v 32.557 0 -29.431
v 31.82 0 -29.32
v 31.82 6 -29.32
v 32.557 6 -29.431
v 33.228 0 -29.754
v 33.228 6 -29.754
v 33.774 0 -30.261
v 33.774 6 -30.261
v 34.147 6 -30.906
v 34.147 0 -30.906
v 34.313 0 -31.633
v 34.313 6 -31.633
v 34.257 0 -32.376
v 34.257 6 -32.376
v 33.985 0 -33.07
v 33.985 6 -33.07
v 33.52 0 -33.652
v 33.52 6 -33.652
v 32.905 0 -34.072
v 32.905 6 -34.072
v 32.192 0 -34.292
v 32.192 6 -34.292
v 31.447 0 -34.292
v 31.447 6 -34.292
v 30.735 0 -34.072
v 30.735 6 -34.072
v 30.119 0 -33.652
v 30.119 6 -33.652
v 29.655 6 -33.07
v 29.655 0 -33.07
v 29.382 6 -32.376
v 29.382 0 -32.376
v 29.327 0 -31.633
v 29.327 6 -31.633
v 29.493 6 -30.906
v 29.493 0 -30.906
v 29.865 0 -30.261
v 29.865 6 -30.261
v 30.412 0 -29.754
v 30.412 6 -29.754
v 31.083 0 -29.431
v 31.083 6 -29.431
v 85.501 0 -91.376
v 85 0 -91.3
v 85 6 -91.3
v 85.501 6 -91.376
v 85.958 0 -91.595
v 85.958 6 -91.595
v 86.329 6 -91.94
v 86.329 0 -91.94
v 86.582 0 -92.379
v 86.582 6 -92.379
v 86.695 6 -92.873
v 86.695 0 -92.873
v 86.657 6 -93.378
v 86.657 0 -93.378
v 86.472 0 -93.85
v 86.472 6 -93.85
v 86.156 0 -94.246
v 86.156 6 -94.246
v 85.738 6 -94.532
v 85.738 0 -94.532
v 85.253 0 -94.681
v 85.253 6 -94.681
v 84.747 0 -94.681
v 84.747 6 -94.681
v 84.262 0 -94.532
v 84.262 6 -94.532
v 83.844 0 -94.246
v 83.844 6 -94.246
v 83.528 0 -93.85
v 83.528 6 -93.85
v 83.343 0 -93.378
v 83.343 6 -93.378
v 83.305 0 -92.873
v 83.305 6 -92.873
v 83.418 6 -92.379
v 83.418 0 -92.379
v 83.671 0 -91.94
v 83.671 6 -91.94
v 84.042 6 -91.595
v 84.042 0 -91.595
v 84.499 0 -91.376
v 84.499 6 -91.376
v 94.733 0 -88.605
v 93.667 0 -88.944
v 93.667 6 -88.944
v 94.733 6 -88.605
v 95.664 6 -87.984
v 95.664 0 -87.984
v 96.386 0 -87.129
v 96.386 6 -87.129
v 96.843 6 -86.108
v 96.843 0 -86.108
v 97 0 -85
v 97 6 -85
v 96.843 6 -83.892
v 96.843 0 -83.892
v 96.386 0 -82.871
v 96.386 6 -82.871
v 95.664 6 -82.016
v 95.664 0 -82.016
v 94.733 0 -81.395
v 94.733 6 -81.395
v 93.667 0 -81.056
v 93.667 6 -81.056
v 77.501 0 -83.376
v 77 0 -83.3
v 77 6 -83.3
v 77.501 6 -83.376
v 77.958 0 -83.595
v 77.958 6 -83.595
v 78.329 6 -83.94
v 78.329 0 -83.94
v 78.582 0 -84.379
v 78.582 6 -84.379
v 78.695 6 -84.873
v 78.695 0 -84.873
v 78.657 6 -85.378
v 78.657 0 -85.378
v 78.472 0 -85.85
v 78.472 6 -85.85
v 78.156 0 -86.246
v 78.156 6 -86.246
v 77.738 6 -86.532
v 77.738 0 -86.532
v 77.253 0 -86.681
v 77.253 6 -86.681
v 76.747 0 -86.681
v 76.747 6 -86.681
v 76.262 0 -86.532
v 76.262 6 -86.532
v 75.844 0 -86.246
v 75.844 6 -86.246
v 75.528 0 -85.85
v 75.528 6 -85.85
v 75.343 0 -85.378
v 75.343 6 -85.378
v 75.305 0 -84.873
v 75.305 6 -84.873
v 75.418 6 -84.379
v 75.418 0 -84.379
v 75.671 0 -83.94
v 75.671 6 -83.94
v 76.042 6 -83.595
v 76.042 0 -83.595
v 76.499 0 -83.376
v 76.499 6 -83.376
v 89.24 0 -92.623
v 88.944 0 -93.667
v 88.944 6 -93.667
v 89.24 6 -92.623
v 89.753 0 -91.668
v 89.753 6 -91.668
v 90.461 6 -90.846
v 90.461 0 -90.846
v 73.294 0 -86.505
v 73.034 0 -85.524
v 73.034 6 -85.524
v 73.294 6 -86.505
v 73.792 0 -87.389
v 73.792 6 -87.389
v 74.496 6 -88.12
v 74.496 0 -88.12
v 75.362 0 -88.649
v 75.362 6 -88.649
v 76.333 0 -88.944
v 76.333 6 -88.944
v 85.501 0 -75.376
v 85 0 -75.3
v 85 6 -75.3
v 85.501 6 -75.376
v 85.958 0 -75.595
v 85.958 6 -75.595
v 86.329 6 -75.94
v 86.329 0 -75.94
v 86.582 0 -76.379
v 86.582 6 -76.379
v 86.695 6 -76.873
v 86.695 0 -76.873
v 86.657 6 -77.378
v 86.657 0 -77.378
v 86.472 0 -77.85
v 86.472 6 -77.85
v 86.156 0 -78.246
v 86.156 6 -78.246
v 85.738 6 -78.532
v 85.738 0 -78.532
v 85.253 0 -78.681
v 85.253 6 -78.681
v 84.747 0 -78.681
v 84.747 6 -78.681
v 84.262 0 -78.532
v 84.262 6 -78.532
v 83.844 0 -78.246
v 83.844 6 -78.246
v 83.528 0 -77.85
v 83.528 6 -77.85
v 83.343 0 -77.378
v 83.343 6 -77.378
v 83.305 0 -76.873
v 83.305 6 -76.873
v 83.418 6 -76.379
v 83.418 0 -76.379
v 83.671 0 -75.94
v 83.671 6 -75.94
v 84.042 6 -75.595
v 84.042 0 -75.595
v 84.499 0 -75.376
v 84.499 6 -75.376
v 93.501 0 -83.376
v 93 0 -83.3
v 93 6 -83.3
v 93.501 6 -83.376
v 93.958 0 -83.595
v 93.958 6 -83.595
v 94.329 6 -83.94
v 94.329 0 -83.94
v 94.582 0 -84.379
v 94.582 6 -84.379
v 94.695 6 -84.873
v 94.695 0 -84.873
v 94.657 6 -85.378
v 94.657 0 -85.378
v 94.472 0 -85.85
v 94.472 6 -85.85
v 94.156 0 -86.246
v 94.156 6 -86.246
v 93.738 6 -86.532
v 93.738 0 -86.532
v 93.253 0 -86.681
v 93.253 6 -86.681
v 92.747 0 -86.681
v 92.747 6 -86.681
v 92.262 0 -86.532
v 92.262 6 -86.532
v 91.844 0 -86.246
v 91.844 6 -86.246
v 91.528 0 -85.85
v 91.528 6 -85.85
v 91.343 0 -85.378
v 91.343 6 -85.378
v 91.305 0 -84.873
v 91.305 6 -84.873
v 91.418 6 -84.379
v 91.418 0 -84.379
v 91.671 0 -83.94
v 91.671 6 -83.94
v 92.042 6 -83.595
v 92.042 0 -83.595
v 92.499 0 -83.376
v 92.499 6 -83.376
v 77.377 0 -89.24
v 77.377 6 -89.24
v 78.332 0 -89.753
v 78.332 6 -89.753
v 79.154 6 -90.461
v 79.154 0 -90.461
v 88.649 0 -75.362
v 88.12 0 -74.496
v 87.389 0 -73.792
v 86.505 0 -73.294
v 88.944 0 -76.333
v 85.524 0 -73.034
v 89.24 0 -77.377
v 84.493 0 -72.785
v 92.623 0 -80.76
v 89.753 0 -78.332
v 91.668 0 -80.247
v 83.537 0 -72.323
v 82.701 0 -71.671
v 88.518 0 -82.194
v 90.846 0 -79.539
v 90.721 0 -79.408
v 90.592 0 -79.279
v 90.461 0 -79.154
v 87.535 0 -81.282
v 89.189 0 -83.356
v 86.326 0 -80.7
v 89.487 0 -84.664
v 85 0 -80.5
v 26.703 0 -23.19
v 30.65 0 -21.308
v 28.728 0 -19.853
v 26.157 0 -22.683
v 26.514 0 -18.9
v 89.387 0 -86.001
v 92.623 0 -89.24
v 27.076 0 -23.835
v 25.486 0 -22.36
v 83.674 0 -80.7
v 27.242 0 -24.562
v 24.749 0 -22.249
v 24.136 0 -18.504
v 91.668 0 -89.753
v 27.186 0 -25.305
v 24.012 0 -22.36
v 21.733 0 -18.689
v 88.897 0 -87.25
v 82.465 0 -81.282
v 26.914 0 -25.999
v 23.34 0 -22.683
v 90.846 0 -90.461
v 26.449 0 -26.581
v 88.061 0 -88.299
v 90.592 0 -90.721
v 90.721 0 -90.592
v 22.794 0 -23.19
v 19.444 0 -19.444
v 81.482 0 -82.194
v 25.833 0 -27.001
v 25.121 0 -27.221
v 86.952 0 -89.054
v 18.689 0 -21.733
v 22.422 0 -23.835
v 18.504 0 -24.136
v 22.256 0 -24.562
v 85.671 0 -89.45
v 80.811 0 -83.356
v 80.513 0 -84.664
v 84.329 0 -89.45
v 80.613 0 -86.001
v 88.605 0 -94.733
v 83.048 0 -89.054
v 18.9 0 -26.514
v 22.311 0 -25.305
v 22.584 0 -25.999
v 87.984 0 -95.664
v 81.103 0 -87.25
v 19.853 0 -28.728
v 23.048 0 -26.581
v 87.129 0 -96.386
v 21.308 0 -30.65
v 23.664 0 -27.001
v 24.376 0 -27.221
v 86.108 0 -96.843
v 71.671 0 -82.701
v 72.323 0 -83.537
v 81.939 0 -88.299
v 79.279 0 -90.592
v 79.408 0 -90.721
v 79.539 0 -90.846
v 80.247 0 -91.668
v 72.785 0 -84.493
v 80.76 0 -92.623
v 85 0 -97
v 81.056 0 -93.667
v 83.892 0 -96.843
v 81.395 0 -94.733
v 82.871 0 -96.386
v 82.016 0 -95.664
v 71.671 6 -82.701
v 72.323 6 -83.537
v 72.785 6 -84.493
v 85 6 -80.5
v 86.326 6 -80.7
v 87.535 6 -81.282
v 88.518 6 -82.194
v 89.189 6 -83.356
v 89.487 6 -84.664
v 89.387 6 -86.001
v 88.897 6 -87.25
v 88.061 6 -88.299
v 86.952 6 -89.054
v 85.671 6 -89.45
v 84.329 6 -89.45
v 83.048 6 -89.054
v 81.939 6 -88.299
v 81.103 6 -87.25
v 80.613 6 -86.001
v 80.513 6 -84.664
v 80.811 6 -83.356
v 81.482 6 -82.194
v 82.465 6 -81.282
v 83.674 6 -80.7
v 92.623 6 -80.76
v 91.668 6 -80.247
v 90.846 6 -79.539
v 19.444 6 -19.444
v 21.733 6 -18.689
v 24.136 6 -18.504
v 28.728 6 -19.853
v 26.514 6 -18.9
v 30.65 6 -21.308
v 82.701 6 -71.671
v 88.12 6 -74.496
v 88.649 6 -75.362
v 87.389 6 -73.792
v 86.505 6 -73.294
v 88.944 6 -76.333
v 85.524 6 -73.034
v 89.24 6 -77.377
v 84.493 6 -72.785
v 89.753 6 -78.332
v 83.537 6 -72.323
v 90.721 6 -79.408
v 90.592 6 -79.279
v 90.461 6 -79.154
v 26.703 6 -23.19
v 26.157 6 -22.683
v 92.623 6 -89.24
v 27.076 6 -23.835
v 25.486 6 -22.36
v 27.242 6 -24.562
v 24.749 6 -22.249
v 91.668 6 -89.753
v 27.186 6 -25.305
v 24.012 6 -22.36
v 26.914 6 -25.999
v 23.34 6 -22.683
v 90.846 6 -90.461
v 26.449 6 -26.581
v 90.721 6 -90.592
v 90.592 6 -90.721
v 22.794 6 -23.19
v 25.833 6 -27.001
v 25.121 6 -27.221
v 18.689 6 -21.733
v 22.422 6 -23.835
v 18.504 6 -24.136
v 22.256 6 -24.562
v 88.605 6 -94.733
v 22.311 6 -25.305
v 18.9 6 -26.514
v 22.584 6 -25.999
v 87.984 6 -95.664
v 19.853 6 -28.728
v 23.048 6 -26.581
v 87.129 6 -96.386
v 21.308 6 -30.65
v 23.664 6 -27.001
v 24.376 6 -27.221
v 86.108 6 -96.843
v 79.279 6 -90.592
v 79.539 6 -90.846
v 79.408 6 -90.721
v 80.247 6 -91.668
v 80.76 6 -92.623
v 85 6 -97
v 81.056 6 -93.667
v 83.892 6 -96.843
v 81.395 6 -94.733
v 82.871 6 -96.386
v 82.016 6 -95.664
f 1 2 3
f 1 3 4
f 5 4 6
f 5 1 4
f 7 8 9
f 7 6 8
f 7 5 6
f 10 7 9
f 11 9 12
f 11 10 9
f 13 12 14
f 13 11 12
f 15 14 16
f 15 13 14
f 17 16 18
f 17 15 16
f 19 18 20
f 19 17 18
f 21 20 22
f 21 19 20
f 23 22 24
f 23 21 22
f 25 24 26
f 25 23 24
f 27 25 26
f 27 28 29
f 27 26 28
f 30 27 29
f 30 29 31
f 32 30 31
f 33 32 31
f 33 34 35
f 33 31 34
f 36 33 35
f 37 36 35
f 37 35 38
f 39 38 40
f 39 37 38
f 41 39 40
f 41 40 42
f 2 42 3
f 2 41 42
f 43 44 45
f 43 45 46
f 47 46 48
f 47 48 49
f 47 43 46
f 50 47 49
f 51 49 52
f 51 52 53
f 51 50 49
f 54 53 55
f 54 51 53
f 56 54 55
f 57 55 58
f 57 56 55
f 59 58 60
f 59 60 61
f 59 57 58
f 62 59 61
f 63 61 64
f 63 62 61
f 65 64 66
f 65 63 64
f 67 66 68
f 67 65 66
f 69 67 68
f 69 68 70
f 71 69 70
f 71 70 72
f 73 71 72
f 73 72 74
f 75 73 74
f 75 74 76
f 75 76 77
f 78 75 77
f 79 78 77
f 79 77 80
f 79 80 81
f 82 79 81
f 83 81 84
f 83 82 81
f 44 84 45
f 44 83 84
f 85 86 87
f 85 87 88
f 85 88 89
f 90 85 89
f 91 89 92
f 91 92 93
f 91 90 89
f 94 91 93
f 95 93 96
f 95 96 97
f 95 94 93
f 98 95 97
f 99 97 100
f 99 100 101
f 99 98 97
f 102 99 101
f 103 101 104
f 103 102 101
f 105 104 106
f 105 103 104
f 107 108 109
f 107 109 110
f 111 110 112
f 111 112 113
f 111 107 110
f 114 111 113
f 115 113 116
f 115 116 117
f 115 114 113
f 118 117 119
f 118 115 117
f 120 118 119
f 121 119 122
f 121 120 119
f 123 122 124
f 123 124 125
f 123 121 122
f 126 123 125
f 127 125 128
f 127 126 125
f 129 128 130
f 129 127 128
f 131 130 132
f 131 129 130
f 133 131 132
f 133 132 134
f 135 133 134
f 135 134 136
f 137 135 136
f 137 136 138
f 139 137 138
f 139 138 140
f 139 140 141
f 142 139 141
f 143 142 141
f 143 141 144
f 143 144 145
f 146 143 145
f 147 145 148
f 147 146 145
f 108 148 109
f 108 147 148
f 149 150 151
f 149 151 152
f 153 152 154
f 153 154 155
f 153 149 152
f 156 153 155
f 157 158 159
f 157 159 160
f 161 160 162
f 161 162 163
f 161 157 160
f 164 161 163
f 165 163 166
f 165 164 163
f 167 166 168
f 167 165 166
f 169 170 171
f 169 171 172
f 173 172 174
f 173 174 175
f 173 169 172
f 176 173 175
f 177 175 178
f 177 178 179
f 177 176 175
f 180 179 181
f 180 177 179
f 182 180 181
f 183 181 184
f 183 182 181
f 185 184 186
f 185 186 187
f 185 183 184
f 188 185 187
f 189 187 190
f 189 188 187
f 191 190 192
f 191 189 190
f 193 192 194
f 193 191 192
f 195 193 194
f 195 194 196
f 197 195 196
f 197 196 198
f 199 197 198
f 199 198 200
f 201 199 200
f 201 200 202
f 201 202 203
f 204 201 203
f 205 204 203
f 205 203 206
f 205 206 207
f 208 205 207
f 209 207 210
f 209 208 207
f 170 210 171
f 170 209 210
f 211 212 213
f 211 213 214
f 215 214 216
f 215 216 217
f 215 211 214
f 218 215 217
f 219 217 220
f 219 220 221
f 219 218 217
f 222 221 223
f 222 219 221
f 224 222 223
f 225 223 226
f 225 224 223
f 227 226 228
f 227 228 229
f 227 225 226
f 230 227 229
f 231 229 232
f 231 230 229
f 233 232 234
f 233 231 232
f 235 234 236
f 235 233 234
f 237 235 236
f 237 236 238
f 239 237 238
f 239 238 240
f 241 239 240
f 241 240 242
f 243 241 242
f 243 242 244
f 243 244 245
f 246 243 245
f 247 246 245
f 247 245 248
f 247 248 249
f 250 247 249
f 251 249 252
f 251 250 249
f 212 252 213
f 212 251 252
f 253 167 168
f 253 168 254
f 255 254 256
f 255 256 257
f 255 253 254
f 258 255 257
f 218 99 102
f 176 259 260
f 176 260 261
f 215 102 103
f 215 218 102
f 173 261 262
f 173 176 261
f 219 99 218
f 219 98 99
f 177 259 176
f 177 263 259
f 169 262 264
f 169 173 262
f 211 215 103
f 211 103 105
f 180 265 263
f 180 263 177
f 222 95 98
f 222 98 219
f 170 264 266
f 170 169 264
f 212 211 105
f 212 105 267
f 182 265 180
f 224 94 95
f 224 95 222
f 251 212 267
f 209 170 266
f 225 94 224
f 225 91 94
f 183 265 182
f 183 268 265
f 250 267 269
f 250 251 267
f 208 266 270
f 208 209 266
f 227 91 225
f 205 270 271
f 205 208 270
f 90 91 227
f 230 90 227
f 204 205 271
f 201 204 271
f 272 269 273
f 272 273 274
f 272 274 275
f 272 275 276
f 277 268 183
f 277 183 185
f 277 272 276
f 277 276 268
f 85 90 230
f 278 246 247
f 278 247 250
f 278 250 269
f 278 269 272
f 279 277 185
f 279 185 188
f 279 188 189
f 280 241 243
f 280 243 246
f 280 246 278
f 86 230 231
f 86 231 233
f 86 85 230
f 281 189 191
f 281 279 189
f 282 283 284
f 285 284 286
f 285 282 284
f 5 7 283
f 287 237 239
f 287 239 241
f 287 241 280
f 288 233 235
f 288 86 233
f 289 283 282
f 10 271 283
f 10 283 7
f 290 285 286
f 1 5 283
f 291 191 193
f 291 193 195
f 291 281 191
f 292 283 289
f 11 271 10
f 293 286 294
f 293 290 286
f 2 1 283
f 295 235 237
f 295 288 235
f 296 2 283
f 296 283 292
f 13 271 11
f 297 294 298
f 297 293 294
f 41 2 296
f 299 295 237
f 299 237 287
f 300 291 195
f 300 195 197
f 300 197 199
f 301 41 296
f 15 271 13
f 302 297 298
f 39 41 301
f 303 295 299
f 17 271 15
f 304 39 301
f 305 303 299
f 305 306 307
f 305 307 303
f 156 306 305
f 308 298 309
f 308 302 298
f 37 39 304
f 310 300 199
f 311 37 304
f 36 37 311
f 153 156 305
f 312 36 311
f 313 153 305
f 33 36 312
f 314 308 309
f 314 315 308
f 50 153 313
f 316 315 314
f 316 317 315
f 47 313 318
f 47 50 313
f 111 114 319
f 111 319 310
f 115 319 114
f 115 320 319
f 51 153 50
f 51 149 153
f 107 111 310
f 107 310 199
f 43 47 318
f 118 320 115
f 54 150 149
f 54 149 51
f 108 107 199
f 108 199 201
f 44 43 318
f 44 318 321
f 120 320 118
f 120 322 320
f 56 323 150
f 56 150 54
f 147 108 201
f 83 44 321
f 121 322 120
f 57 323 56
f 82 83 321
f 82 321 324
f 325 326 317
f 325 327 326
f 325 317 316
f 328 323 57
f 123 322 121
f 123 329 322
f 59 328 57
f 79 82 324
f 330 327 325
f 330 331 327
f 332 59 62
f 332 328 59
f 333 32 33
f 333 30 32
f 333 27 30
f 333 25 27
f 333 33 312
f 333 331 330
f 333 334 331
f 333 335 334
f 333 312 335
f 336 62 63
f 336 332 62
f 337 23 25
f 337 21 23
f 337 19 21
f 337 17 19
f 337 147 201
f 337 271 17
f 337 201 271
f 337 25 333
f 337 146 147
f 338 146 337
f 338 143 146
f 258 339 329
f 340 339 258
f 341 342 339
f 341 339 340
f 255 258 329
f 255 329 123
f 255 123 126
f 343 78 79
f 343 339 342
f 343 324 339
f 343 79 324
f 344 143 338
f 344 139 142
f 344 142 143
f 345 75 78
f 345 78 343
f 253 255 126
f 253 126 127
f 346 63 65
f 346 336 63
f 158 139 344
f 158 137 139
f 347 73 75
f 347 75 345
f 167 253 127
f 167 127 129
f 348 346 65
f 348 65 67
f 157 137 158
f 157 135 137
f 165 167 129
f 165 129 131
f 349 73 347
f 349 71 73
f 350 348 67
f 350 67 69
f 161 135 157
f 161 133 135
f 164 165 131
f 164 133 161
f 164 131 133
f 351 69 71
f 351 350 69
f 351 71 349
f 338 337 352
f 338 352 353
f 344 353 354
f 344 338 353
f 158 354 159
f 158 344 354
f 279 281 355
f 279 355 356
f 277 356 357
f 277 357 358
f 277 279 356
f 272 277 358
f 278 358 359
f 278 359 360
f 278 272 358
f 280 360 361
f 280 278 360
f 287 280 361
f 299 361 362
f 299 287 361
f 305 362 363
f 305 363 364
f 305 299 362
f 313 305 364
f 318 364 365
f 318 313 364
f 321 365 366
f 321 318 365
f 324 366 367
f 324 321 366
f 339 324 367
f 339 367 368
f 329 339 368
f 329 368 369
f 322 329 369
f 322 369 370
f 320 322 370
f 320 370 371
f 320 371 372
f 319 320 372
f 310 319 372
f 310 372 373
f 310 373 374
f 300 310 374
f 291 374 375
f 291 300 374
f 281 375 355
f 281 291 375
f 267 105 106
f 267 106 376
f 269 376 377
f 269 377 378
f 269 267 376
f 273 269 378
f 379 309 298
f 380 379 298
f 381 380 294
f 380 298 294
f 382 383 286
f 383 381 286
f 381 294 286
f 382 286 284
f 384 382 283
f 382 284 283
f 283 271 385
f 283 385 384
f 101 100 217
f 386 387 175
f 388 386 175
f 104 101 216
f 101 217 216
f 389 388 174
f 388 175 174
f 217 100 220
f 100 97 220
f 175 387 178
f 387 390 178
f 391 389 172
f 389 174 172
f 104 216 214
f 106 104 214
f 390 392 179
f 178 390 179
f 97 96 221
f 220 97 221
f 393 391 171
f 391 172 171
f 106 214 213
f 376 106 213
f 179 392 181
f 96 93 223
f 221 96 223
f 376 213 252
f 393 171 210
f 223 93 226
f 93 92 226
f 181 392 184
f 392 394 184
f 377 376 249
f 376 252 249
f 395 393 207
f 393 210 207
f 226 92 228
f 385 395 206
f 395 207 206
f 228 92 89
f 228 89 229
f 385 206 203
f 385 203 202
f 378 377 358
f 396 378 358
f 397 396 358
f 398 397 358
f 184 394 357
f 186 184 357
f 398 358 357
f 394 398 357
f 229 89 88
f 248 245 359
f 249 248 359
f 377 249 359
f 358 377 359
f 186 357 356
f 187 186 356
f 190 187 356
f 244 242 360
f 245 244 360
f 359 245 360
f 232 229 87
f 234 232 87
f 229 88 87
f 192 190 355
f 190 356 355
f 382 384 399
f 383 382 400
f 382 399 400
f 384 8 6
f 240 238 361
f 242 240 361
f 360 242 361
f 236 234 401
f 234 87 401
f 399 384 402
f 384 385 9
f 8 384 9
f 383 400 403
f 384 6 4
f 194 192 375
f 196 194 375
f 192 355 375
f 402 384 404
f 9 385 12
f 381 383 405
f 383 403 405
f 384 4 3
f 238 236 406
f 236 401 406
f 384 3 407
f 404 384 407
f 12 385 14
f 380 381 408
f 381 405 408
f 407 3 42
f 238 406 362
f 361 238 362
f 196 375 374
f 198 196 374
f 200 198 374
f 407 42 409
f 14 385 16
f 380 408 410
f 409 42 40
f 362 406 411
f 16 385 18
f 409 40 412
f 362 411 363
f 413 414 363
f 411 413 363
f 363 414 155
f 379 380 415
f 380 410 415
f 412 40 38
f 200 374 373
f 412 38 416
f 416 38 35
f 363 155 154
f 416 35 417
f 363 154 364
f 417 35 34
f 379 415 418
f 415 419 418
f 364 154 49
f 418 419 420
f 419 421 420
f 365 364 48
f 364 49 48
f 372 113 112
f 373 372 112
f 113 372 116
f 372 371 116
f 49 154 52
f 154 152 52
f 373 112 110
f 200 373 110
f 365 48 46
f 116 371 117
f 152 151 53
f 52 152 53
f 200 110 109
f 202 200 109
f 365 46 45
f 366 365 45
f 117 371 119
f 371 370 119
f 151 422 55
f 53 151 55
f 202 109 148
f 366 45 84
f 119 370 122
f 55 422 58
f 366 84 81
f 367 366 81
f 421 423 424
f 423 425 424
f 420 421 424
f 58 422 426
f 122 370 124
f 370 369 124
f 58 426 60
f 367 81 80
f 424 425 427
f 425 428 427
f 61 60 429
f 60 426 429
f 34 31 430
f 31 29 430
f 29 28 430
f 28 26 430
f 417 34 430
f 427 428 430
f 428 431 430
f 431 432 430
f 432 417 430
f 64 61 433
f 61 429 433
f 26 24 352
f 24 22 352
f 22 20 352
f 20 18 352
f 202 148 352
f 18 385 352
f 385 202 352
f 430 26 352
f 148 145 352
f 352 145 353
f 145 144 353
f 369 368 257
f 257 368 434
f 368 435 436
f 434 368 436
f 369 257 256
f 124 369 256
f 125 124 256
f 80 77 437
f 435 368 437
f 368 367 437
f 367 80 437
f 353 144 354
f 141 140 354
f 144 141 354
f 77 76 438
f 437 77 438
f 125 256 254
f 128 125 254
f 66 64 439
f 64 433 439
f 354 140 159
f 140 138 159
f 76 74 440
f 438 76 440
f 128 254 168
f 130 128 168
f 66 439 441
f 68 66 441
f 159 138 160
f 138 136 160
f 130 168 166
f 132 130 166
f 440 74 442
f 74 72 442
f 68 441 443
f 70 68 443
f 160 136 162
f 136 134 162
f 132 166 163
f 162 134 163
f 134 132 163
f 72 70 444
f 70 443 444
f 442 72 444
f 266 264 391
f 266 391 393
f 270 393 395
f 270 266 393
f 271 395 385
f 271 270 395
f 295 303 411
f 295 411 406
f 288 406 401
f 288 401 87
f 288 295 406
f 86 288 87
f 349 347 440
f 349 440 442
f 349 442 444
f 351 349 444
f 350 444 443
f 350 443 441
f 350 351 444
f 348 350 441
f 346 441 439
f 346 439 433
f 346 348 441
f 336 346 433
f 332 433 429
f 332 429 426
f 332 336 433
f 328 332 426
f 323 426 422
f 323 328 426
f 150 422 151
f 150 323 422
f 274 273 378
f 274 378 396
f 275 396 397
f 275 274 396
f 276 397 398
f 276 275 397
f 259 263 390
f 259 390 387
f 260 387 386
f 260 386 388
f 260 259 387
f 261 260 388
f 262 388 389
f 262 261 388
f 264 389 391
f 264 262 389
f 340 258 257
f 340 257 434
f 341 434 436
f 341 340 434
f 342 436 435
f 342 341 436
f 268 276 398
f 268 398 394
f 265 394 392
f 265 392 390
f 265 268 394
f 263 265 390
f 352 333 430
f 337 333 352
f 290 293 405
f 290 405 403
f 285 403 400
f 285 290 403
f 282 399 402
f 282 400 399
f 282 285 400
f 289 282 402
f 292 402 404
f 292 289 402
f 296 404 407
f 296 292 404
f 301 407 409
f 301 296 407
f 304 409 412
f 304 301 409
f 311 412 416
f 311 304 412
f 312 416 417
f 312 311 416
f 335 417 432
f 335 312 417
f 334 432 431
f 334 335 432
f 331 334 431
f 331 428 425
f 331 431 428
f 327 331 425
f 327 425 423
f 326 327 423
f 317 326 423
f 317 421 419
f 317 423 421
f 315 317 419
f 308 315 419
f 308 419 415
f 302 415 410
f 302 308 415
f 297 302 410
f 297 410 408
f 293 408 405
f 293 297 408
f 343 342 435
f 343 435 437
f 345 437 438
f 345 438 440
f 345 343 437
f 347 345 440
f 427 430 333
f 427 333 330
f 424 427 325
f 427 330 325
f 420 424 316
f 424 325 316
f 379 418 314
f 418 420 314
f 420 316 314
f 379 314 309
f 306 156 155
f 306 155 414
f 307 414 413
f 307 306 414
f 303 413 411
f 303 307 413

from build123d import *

# Parameters (mm, degrees)
SKETCH2_R               = 1.7
SKETCH2_R_2             = 4.5
BOSS_EXTRUDE1_DEPTH     = 6
FILLET1_R               = 10
CUT_EXTRUDE2_DEPTH      = 138.309868546
CUT_EXTRUDE2_DEPTH_BACK = 138.309868546
SKETCH7_R               = 2.5


with BuildPart() as part:
    # Sketch2 → Boss-Extrude1 (new body)
    with BuildSketch(Plane(origin=(0, 0, 0), x_dir=(1, 0, 0), z_dir=(0, 1, 0))):
        with BuildLine():
            Line((82.701229094, 71.670763572), (23.580603164, 14.468001358))
            Line((23.580603164, 14.468001358), (14.468001358, 23.580603164))
            Line((14.468001358, 23.580603164), (71.670763572, 82.701229094))
            ThreePointArc((71.670763572, 82.701229094), (72.579468699, 84.002771186), (73.034411761, 85.523555075))
            ThreePointArc((73.034411761, 85.523555075), (74.120868496, 87.776797037), (76.333333333, 88.944053189))
            ThreePointArc((76.333333333, 88.944053189), (77.868327334, 89.470595445), (79.153846154, 90.460996723))
            ThreePointArc((79.153846154, 90.460996723), (79.343145751, 90.656854249), (79.539003277, 90.846153846))
            ThreePointArc((79.539003277, 90.846153846), (80.529404555, 92.131672666), (81.055946811, 93.666666667))
            ThreePointArc((81.055946811, 93.666666667), (85, 97), (88.944053189, 93.666666667))
            ThreePointArc((88.944053189, 93.666666667), (89.470595445, 92.131672666), (90.460996723, 90.846153846))
            ThreePointArc((90.460996723, 90.846153846), (90.656854249, 90.656854249), (90.846153846, 90.460996723))
            ThreePointArc((90.846153846, 90.460996723), (92.131672666, 89.470595445), (93.666666667, 88.944053189))
            ThreePointArc((93.666666667, 88.944053189), (97, 85), (93.666666667, 81.055946811))
            ThreePointArc((93.666666667, 81.055946811), (92.131672666, 80.529404555), (90.846153846, 79.539003277))
            ThreePointArc((90.846153846, 79.539003277), (90.656854249, 79.343145751), (90.460996723, 79.153846154))
            ThreePointArc((90.460996723, 79.153846154), (89.470595445, 77.868327334), (88.944053189, 76.333333333))
            ThreePointArc((88.944053189, 76.333333333), (87.776797037, 74.120868496), (85.523555075, 73.034411761))
            ThreePointArc((85.523555075, 73.034411761), (84.002771186, 72.579468699), (82.701229094, 71.670763572))
        make_face()
        with Locations(Location((85, 93, 0), (0, 0, 270))):
            Circle(SKETCH2_R, mode=Mode.SUBTRACT)
        with Locations(Location((93, 85, 0), (0, 0, 270))):
            Circle(SKETCH2_R, mode=Mode.SUBTRACT)
        with Locations(Location((85, 77, 0), (0, 0, 270))):
            Circle(SKETCH2_R, mode=Mode.SUBTRACT)
        with Locations(Location((77, 85, 0), (0, 0, 270))):
            Circle(SKETCH2_R, mode=Mode.SUBTRACT)
        with Locations(Location((85, 85, 0), (0, 0, 270))):
            Circle(SKETCH2_R_2, mode=Mode.SUBTRACT)
    extrude(amount=BOSS_EXTRUDE1_DEPTH)

    # Fillet1
    # the kernel refuses this fillet: 10 mm, written as the material it takes off along each edge
    with BuildSketch(Plane(origin=(23.580603164, -24.591214075, -14.468001358), x_dir=(0.71866742198992, 0, -0.6953539649490483), z_dir=(0, 1, 0)), Plane(origin=(14.468001358, -24.591214075, -23.580603164), x_dir=(0.7071067811865477, 0, 0.7071067811865475), z_dir=(0, 1, 0))) as fillet1_piece_1:
        with BuildLine():
            CenterArc((FILLET1_R * 0.983648563013, FILLET1_R), FILLET1_R, 180.944569645, 89.055430355)
            Line((-FILLET1_R * 0.0162155484343, FILLET1_R * 0.983514896433), (0, 0))
            Line((0, 0), (FILLET1_R * 0.983648563013, 0))
        make_face()
    extrude(amount=55.182428151, mode=Mode.SUBTRACT)

    # Sketch7 → Cut-Extrude2 (cut, two sides: drawn at the far end of the back side and taken through both)
    with BuildSketch(Plane(origin=(0, 0, 0), x_dir=(1, 0, 0), z_dir=(0, 1, 0)).offset(-CUT_EXTRUDE2_DEPTH_BACK)):
        with Locations(Location((24.748737342, 24.748737342, 0), (0, 0, 270))):
            Circle(SKETCH7_R)
        with Locations(Location((31.819805153, 31.819805153, 0), (0, 0, 270))):
            Circle(SKETCH7_R)
    extrude(amount=CUT_EXTRUDE2_DEPTH + CUT_EXTRUDE2_DEPTH_BACK, mode=Mode.SUBTRACT)


solid = part.part
